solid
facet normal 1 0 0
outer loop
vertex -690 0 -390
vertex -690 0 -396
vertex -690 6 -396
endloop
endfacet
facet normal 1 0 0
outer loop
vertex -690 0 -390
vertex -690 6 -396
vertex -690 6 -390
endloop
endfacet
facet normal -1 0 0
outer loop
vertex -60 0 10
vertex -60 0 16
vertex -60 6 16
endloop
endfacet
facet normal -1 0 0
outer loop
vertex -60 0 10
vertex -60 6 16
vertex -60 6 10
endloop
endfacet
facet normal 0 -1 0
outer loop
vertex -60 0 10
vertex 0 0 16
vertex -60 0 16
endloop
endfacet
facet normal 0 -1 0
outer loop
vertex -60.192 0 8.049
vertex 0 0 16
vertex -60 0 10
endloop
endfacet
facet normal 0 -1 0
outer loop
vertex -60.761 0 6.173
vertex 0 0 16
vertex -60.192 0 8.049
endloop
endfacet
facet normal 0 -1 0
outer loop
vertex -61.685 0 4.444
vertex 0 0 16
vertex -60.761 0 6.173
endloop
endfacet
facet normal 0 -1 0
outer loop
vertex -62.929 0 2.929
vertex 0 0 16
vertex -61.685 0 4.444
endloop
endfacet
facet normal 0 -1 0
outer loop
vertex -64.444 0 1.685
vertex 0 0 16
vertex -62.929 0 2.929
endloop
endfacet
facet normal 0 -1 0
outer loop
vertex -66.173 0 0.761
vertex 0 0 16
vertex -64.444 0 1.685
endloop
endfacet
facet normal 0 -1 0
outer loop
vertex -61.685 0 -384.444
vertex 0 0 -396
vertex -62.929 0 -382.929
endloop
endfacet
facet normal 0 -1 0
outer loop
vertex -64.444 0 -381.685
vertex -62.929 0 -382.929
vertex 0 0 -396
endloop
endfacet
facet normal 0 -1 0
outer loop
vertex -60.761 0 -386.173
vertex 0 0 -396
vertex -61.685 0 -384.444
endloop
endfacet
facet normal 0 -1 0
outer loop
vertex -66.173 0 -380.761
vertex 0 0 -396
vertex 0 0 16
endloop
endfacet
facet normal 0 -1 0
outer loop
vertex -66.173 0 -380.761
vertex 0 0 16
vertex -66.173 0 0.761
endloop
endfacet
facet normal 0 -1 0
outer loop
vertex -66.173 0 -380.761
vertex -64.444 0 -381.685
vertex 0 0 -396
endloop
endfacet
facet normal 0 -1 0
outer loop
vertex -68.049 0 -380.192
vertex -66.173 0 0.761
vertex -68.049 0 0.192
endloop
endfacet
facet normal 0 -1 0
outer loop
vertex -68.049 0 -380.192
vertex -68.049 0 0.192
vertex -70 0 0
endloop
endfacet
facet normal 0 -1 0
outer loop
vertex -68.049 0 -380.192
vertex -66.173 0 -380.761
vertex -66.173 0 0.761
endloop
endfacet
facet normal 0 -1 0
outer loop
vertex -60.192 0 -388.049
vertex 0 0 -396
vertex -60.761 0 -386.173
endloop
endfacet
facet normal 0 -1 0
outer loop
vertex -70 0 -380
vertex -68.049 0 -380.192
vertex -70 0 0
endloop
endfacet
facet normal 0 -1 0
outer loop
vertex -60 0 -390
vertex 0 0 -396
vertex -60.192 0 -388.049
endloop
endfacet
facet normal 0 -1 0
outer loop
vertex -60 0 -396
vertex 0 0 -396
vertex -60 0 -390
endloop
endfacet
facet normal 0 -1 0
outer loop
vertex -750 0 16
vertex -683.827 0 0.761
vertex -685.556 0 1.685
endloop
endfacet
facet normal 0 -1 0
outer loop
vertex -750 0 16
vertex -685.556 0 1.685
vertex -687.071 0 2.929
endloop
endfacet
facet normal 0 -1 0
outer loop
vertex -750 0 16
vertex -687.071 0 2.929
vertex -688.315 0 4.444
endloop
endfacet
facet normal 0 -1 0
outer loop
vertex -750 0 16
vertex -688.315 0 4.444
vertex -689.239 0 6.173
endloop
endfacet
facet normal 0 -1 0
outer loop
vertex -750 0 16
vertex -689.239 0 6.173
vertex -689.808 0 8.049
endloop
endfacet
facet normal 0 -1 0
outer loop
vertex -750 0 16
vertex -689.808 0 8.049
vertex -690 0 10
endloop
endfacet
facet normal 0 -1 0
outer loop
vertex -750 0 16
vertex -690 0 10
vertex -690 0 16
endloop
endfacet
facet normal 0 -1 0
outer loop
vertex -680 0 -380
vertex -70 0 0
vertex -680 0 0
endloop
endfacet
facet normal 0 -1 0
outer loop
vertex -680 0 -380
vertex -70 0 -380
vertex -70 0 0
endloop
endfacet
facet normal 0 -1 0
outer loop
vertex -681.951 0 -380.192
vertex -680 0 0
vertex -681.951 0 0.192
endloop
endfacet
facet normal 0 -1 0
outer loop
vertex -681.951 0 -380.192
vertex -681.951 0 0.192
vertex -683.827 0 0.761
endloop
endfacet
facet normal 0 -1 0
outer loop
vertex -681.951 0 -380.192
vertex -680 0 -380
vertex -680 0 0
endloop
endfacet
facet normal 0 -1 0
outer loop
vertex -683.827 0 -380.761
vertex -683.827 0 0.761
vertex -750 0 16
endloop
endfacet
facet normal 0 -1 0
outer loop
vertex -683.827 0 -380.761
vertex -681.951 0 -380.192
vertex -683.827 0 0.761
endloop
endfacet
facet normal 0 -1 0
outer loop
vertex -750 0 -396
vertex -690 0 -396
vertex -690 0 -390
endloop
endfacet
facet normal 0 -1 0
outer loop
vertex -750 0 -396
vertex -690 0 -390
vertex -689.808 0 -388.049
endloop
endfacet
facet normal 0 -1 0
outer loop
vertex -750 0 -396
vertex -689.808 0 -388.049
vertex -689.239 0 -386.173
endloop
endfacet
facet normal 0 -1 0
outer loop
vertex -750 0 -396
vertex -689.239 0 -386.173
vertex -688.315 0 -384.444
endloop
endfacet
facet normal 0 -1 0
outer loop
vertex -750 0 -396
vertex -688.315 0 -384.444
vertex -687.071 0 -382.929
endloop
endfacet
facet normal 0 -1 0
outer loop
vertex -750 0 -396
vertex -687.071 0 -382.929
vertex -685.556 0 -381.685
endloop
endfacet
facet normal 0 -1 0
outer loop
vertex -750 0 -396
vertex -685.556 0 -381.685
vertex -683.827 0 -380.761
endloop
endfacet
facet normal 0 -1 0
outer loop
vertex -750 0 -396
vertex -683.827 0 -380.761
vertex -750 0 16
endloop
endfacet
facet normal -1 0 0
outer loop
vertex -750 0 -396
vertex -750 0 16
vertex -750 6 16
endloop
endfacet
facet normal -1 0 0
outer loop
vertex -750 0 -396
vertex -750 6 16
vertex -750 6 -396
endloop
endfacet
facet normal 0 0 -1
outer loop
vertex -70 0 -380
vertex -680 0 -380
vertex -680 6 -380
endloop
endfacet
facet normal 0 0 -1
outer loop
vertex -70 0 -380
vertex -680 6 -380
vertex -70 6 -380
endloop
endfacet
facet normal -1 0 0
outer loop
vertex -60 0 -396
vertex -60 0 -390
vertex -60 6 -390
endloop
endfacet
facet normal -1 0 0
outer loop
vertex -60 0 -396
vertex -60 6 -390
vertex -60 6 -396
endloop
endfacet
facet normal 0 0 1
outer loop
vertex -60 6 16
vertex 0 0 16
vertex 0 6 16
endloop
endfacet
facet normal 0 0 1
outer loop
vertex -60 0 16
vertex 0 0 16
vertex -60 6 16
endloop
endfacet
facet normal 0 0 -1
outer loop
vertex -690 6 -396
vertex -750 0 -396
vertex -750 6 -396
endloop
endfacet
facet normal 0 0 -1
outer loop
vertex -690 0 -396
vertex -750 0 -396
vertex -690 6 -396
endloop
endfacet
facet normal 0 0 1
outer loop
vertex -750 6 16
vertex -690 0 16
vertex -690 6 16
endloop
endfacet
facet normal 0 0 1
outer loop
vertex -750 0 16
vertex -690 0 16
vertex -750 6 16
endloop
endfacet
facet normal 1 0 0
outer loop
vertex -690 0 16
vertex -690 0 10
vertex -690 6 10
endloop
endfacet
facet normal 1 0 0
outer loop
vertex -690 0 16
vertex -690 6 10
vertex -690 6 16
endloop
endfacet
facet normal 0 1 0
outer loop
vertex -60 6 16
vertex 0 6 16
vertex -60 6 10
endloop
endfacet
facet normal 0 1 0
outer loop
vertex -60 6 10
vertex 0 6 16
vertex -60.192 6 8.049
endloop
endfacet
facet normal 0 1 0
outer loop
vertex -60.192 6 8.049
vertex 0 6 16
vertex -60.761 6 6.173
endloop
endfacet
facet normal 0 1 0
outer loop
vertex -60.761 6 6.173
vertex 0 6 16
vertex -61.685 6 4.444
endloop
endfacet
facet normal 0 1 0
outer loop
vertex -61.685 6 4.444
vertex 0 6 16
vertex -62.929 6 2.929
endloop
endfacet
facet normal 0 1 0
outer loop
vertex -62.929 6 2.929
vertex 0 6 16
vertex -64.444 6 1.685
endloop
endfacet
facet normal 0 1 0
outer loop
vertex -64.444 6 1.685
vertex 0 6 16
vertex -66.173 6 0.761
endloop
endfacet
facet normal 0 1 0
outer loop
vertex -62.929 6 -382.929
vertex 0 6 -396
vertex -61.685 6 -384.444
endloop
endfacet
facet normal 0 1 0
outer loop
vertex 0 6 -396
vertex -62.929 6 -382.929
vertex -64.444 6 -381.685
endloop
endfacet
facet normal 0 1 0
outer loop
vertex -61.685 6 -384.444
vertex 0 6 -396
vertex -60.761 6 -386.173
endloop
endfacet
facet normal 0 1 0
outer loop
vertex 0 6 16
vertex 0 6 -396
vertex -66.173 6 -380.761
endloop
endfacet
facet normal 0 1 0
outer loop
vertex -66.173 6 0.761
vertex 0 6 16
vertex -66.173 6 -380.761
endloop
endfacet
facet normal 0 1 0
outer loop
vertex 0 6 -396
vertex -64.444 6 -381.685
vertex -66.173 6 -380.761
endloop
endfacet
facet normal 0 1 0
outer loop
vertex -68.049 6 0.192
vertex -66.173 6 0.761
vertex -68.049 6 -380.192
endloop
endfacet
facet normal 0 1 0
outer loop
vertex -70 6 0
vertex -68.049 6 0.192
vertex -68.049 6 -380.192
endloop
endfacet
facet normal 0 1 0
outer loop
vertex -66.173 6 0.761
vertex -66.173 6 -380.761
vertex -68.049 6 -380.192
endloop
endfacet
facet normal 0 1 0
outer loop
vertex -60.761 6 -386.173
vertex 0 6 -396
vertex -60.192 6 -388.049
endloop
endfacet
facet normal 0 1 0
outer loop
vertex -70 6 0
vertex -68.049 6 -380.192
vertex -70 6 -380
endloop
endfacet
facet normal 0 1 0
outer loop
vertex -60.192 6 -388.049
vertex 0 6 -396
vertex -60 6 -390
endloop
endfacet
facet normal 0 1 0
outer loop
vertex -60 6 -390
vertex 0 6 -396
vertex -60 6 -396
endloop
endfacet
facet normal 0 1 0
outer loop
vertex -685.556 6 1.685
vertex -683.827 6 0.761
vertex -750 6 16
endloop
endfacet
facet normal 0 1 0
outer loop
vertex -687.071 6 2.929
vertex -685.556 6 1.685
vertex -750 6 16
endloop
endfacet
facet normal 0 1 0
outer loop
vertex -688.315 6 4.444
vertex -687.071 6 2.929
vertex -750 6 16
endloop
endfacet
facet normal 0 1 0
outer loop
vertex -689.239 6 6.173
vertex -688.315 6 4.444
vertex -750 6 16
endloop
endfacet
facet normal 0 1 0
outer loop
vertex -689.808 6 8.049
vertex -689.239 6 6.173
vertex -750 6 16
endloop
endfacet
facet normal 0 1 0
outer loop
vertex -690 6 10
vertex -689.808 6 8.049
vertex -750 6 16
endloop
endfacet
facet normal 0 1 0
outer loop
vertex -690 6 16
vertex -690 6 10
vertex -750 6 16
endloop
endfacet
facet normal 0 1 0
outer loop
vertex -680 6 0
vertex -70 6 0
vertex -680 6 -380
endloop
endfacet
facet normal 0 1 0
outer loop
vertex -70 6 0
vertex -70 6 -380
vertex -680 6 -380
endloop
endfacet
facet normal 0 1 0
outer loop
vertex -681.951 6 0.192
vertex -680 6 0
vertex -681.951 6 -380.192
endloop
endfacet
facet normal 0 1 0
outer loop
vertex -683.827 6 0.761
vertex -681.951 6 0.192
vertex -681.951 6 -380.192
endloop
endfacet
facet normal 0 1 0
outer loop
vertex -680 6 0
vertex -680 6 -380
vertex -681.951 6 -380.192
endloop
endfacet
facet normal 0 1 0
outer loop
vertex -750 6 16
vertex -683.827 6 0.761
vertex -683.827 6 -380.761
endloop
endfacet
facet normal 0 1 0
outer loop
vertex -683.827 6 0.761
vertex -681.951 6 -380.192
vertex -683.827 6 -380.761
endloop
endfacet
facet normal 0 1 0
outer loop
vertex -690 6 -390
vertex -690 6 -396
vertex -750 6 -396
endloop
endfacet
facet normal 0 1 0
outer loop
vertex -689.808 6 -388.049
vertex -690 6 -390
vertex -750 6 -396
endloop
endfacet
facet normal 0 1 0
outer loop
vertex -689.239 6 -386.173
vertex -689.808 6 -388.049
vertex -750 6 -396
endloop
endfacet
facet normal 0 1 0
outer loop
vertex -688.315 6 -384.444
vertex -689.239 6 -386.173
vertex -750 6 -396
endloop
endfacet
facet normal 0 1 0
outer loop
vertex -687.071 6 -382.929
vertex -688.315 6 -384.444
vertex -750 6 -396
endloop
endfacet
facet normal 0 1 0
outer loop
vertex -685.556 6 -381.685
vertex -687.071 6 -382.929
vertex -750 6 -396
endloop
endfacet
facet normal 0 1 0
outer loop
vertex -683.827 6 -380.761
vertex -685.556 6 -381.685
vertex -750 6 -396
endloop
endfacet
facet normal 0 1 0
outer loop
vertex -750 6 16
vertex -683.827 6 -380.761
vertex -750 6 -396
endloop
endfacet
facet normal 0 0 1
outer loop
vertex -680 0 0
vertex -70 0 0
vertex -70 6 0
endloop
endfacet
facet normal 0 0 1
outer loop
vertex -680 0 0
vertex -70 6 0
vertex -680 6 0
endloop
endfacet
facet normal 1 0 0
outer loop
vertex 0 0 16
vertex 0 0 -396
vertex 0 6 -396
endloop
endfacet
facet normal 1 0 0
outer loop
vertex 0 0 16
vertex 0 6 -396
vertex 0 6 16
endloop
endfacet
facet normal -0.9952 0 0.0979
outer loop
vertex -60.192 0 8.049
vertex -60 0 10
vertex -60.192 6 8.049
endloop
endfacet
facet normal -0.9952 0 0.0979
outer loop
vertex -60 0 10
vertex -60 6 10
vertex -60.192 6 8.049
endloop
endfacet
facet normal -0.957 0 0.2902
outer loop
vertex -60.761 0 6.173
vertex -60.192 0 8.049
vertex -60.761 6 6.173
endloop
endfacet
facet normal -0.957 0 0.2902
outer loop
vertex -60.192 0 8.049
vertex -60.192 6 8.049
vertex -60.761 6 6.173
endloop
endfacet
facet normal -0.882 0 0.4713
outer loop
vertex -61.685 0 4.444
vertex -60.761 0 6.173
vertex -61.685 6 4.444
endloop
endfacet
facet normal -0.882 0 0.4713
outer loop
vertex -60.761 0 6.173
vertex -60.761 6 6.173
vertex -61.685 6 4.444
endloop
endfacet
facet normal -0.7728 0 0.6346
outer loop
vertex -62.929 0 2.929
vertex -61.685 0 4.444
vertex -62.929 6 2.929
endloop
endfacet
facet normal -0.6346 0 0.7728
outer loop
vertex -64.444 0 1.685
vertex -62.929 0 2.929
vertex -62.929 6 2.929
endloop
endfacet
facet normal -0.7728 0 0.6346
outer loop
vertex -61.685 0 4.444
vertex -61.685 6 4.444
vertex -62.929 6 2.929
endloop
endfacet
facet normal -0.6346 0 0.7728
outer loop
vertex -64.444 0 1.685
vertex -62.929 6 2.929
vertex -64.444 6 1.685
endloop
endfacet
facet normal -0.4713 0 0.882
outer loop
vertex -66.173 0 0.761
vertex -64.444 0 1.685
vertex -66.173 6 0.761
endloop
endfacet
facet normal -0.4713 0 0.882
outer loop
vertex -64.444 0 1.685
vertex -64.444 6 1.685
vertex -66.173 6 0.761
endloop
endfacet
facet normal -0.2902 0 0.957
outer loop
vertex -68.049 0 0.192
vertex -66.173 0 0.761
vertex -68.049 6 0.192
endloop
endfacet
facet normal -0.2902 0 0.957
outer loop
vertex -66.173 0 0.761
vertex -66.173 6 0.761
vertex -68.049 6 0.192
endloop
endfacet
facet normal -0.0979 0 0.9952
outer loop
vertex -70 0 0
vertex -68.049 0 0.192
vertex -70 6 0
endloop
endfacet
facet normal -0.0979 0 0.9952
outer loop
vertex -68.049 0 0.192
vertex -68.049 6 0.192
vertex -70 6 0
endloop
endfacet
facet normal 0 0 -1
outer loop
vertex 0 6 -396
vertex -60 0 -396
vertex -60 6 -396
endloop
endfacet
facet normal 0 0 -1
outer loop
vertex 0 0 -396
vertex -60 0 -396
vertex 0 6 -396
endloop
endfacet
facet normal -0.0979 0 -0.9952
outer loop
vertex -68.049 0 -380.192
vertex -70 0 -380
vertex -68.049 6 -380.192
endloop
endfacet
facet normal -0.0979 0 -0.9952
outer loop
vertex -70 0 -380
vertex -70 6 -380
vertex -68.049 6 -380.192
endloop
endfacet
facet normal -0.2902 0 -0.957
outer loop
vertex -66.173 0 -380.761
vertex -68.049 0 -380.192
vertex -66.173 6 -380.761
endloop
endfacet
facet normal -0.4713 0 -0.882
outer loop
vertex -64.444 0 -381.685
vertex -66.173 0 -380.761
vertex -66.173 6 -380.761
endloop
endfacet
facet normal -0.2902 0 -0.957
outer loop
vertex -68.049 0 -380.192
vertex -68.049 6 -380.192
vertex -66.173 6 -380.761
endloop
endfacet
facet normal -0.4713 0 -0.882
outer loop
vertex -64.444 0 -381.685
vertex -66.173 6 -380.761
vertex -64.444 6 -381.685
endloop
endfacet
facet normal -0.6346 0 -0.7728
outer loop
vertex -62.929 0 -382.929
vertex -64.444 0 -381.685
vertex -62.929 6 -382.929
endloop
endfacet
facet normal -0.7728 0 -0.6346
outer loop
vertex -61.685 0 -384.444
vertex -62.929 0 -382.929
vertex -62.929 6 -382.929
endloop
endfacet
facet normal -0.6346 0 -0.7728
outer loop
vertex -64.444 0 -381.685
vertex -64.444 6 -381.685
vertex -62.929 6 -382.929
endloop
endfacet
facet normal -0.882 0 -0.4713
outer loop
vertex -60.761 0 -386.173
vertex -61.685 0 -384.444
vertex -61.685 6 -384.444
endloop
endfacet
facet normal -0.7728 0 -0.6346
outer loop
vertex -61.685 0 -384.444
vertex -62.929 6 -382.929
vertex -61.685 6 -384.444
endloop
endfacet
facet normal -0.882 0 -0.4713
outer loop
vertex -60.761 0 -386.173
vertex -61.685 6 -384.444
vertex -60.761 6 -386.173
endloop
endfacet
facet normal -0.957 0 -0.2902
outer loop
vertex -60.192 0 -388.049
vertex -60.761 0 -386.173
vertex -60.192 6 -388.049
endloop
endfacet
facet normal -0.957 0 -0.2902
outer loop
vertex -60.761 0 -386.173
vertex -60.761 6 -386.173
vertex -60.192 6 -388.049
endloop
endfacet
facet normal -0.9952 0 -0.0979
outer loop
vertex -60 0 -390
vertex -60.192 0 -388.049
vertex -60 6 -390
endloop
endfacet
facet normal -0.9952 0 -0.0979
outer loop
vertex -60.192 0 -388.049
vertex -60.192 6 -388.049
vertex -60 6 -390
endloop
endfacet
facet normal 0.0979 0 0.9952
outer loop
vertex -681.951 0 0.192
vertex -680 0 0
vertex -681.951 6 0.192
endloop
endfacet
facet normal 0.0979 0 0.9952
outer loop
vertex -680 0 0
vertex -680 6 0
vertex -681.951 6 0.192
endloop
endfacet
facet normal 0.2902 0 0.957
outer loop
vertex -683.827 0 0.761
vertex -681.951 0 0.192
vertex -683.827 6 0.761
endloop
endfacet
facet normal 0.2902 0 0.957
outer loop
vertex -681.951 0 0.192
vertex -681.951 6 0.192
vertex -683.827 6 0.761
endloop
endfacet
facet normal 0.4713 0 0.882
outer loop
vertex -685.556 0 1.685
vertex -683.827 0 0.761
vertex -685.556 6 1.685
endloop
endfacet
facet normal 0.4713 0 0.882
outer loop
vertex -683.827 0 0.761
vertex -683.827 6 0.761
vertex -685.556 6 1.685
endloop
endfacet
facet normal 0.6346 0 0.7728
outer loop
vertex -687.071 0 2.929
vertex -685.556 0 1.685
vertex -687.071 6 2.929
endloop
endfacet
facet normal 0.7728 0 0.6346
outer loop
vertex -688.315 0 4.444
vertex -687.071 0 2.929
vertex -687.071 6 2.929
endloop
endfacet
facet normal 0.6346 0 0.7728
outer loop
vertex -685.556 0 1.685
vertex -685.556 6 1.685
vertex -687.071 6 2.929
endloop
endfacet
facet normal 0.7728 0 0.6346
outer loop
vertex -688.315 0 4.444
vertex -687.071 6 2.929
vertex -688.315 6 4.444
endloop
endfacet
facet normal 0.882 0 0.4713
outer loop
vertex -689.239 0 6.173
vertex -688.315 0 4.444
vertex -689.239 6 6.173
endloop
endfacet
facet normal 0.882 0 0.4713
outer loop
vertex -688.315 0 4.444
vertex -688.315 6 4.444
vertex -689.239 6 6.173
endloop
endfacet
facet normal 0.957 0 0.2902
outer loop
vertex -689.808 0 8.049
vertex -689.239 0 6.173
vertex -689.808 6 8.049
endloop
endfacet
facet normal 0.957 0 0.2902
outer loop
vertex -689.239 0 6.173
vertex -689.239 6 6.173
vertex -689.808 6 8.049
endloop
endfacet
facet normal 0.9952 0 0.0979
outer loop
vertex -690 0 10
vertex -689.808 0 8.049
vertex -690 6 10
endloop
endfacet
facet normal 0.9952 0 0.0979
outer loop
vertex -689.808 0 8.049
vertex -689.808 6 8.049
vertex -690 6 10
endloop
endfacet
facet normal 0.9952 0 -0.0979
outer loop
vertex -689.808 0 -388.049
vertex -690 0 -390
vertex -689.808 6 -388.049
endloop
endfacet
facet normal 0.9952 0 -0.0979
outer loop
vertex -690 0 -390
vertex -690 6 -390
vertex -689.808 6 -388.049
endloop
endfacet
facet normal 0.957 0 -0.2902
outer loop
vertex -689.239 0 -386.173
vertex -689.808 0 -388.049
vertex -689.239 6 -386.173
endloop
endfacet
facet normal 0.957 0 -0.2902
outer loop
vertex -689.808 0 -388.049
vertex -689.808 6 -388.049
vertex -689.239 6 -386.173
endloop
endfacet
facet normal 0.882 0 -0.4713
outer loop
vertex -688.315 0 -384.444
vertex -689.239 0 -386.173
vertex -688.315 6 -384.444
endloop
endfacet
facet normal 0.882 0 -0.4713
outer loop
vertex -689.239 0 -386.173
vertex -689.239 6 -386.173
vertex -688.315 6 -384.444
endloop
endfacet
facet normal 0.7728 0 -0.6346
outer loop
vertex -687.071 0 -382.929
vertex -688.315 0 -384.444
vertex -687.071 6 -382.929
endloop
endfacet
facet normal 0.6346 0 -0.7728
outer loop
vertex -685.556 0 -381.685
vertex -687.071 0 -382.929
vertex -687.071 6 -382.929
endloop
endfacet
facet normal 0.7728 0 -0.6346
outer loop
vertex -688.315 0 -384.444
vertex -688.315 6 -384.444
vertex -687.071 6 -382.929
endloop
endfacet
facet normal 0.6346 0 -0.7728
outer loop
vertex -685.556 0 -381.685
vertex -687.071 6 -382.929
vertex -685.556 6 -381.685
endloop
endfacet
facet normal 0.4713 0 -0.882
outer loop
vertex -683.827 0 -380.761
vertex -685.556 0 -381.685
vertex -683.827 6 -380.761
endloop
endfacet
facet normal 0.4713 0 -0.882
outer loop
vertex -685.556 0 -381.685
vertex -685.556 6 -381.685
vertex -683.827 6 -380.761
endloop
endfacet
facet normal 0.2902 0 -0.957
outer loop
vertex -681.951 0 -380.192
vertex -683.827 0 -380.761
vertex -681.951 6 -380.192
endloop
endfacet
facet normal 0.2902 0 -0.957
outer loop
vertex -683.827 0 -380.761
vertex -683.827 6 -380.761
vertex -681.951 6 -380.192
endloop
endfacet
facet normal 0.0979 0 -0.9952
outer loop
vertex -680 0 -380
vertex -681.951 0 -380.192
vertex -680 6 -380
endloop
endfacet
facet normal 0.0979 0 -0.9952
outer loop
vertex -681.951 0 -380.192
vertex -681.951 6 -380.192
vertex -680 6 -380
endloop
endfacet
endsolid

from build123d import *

# Parameters (mm, degrees)
BOSS_EXTRUDE1_DEPTH = 6
FILLET1_R           = 10


with BuildPart() as part:
    # Sketch1 → Boss-Extrude1 (new body)
    with BuildSketch(Plane(origin=(0, 0, 0), x_dir=(1, 0, 0), z_dir=(0, 1, 0))):
        Polygon((-750, 396), (-690, 396), (-690, 380), (-60, 380), (-60, 396), (0, 396), (0, -16), (-60, -16), (-60, 0), (-690, 0), (-690, -16), (-750, -16), align=None)
    extrude(amount=BOSS_EXTRUDE1_DEPTH)

    # Fillet1
    fillet1_edges = [part.edges().sort_by_distance(p)[0] for p in [
        (-690, 3, -380),
        (-60, 3, -380),
        (-60, 3, 0),
        (-690, 3, 0),
    ]]
    fillet(fillet1_edges, radius=FILLET1_R)


solid = part.part
